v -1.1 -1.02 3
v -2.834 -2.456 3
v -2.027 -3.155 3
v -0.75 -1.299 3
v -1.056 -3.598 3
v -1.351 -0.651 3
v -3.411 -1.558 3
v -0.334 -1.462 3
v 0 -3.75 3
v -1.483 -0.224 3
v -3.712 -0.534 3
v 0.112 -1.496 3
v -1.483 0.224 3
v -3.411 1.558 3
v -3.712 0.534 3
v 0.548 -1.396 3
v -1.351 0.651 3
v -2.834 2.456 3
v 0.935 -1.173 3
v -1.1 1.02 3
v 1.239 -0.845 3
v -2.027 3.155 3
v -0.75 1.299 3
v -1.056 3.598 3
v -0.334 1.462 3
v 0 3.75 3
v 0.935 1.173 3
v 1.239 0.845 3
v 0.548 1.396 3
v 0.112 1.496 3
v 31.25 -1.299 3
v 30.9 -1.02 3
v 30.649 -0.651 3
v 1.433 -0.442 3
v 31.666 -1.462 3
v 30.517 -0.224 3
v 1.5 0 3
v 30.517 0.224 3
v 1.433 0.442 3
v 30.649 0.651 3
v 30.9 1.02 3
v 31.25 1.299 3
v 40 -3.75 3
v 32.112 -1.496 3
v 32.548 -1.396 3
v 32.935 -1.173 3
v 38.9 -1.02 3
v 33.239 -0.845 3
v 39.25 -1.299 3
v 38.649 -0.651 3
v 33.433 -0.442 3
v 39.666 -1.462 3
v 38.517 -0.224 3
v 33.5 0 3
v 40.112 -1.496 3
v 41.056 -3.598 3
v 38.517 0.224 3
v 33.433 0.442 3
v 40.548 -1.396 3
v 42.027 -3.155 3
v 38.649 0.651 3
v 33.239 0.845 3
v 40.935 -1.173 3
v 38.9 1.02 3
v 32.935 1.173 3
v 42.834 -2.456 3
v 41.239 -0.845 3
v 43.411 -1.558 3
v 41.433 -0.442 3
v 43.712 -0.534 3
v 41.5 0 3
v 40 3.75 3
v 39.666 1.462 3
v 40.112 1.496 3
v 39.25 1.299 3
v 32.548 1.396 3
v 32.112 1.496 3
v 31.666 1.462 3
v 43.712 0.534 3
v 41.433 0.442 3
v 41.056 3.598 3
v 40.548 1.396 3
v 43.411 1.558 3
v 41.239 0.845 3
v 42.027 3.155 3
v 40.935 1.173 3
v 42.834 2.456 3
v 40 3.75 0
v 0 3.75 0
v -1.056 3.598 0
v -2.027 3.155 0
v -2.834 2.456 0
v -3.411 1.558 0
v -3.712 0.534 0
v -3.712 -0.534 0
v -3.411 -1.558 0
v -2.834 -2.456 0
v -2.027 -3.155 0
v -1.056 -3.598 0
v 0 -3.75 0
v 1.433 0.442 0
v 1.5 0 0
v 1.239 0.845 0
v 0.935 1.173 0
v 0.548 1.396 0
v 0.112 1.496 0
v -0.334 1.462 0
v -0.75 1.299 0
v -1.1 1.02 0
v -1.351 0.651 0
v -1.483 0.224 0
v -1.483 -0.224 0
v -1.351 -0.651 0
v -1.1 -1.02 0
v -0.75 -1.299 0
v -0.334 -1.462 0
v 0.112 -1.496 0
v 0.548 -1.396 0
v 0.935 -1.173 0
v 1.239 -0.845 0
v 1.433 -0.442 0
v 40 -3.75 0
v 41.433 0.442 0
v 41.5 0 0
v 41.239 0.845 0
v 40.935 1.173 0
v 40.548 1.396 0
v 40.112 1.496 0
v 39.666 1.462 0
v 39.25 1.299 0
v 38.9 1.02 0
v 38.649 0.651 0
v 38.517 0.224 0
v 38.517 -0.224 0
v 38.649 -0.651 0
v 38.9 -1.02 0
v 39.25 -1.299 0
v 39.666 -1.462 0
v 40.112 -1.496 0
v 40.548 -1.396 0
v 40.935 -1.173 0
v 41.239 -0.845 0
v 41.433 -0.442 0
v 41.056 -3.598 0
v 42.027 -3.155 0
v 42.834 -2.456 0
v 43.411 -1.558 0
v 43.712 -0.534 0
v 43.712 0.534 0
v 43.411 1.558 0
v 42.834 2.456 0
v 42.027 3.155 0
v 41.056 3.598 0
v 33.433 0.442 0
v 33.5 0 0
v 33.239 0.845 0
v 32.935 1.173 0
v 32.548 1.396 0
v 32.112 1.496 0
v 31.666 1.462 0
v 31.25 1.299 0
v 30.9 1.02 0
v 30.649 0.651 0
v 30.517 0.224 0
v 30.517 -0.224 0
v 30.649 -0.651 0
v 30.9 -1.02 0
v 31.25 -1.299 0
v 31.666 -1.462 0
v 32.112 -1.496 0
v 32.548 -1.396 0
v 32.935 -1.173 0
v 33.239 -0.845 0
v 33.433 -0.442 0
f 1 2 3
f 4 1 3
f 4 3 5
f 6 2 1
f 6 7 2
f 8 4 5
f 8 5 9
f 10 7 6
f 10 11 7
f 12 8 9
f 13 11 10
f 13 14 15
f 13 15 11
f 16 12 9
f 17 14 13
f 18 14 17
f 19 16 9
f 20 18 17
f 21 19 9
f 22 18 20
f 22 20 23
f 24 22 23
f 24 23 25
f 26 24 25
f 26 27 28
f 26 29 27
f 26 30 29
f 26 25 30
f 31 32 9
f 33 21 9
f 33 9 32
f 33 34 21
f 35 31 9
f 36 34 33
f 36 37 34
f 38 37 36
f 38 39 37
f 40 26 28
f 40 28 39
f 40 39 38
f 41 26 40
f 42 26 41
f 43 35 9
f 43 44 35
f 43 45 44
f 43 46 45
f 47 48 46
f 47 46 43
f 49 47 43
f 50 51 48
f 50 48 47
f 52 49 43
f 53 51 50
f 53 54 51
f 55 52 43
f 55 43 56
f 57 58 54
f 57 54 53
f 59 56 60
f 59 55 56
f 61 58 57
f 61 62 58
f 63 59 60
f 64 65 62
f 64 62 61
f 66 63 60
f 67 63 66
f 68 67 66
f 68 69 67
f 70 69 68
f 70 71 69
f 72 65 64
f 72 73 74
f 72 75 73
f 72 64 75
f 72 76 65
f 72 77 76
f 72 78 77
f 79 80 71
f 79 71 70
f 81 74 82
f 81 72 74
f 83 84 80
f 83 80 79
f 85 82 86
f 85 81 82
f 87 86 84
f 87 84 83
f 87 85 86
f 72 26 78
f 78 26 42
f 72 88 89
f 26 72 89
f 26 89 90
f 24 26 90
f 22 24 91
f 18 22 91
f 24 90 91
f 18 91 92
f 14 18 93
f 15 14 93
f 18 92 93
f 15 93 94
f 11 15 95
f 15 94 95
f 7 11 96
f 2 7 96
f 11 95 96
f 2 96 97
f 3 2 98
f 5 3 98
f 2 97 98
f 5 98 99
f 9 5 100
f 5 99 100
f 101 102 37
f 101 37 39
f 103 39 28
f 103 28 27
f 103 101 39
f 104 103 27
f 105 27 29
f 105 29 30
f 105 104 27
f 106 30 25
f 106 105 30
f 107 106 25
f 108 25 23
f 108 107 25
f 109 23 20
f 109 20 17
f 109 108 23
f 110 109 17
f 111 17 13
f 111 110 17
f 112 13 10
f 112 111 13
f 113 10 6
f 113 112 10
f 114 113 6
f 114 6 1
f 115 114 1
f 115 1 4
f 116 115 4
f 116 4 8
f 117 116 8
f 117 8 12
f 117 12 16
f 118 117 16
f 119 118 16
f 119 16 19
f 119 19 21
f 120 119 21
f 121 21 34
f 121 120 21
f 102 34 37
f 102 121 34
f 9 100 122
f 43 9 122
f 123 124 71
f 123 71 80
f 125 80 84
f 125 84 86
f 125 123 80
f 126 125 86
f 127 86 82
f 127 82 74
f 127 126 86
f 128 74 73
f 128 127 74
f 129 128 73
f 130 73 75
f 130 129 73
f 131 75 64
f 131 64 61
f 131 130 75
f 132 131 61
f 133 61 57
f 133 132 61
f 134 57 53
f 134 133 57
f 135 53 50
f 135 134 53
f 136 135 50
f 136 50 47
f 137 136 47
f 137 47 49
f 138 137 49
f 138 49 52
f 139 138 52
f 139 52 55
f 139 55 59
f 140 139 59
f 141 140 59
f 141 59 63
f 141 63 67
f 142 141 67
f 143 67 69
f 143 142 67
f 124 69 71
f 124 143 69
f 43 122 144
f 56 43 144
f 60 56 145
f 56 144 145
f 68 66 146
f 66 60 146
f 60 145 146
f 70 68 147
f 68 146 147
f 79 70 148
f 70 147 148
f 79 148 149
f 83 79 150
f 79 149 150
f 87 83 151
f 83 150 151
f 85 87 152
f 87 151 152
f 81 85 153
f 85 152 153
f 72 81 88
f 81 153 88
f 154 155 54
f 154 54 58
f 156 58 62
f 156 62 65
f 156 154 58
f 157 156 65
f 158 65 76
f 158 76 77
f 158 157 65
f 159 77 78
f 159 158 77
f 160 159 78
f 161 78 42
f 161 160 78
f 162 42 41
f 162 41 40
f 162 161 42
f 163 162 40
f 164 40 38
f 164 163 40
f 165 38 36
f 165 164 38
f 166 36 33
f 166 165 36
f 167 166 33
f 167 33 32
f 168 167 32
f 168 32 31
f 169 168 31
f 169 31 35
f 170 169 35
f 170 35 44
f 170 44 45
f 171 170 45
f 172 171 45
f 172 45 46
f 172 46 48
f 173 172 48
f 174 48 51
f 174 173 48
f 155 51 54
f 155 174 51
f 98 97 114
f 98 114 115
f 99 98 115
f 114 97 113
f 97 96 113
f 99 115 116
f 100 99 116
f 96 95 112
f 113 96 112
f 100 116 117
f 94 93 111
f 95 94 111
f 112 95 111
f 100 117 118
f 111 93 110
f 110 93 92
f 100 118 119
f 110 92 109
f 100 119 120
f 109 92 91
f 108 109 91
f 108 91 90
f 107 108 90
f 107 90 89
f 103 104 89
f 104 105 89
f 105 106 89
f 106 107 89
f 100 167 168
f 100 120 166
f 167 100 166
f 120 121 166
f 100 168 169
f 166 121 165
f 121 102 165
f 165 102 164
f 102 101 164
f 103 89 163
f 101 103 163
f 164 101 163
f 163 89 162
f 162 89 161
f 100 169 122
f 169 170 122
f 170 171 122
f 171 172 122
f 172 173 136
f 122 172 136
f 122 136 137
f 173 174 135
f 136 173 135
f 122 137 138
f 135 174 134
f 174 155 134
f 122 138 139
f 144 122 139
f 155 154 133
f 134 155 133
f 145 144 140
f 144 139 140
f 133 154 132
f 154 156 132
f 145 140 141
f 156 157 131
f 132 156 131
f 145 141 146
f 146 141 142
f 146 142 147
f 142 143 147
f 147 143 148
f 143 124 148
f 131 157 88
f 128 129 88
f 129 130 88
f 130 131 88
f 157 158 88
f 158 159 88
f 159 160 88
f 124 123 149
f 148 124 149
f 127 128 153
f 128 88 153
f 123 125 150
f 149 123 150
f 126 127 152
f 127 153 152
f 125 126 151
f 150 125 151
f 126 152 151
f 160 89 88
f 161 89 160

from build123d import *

# Parameters (mm, degrees)
SKETCH1_R           = 1.5
SKETCH1_R_2         = 3.75
BOSS_EXTRUDE1_DEPTH = 3


with BuildPart() as part:
    # Sketch1 → Boss-Extrude1 (new body)
    # profile 1 of 3: a face of its own
    with BuildSketch(Plane.XY):
        with BuildLine():
            Line((40, 3.75), (0, 3.75))
            ThreePointArc((0, 3.75), (2.651650429, 2.651650429), (3.75, 0))
            ThreePointArc((3.75, 0), (2.651650429, -2.651650429), (0, -3.75))
            Line((0, -3.75), (40, -3.75))
            ThreePointArc((40, -3.75), (36.25, 0), (40, 3.75))
        make_face()
        with Locations((32, 0)):
            Circle(SKETCH1_R, mode=Mode.SUBTRACT)
    # profile 2 of 3: a face of its own
    with BuildSketch(Plane.XY):
        Circle(SKETCH1_R_2)
        Circle(SKETCH1_R, mode=Mode.SUBTRACT)
    # profile 3 of 3: a face of its own
    with BuildSketch(Plane.XY):
        with Locations((40, 0)):
            Circle(SKETCH1_R_2)
        with Locations((40, 0)):
            Circle(SKETCH1_R, mode=Mode.SUBTRACT)
    extrude(amount=BOSS_EXTRUDE1_DEPTH)


solid = part.part
